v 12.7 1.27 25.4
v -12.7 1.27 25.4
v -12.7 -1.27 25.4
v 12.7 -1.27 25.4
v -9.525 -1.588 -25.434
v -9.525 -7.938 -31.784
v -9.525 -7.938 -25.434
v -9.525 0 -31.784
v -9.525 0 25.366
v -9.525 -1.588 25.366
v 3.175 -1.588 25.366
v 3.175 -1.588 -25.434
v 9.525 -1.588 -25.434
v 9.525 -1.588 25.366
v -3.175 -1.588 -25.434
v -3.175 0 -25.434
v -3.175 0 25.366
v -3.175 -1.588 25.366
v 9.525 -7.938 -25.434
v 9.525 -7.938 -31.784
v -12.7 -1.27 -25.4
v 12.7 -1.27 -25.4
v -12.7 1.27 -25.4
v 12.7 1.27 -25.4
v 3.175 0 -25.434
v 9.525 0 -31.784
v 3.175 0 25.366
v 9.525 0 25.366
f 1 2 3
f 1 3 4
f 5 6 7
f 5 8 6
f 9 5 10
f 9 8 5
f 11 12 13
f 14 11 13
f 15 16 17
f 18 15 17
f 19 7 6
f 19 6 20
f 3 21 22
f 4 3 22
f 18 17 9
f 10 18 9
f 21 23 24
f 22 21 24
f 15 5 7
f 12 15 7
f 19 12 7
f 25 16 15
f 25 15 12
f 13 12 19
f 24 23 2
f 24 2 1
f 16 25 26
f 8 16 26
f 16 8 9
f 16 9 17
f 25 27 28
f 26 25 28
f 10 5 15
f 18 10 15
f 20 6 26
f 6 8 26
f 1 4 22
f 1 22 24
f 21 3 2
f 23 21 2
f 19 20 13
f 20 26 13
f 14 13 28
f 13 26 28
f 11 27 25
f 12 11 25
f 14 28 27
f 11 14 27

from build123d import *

# Parameters (mm, degrees)
F0_W     = 25.4
F0_H     = 2.54
F1_DEPTH = 25.4
F3_DEPTH = 1.5875
F4_W     = 19.05
F4_H     = 6.35
F5_DEPTH = 6.35


with BuildPart() as f1:
    # F0 (on Top) → F1 (new body, symmetric)
    with BuildSketch(Plane.XY):
        Rectangle(F0_W, F0_H)
    extrude(amount=F1_DEPTH, both=True)


with BuildPart() as f3:
    # F2 (on Front) → F3 (new body)
    with BuildSketch(Plane.XZ):
        Polygon((-3.175, 25.365581), (-9.525, 25.365581), (-9.525, -25.434419), (-9.525, -31.784419), (9.525, -31.784419), (9.525, -25.434419), (9.525, 25.365581), (3.175, 25.365581), (3.175, -25.434419), (-3.175, -25.434419), align=None)
    extrude(amount=F3_DEPTH)

    # F4 (on face) → F5 (join)
    with BuildSketch(Plane.XZ.offset(1.5875)):
        with Locations((0, -28.609419)):
            Rectangle(F4_W, F4_H)
    extrude(amount=F5_DEPTH)


solid = Compound([f1.part, f3.part])
